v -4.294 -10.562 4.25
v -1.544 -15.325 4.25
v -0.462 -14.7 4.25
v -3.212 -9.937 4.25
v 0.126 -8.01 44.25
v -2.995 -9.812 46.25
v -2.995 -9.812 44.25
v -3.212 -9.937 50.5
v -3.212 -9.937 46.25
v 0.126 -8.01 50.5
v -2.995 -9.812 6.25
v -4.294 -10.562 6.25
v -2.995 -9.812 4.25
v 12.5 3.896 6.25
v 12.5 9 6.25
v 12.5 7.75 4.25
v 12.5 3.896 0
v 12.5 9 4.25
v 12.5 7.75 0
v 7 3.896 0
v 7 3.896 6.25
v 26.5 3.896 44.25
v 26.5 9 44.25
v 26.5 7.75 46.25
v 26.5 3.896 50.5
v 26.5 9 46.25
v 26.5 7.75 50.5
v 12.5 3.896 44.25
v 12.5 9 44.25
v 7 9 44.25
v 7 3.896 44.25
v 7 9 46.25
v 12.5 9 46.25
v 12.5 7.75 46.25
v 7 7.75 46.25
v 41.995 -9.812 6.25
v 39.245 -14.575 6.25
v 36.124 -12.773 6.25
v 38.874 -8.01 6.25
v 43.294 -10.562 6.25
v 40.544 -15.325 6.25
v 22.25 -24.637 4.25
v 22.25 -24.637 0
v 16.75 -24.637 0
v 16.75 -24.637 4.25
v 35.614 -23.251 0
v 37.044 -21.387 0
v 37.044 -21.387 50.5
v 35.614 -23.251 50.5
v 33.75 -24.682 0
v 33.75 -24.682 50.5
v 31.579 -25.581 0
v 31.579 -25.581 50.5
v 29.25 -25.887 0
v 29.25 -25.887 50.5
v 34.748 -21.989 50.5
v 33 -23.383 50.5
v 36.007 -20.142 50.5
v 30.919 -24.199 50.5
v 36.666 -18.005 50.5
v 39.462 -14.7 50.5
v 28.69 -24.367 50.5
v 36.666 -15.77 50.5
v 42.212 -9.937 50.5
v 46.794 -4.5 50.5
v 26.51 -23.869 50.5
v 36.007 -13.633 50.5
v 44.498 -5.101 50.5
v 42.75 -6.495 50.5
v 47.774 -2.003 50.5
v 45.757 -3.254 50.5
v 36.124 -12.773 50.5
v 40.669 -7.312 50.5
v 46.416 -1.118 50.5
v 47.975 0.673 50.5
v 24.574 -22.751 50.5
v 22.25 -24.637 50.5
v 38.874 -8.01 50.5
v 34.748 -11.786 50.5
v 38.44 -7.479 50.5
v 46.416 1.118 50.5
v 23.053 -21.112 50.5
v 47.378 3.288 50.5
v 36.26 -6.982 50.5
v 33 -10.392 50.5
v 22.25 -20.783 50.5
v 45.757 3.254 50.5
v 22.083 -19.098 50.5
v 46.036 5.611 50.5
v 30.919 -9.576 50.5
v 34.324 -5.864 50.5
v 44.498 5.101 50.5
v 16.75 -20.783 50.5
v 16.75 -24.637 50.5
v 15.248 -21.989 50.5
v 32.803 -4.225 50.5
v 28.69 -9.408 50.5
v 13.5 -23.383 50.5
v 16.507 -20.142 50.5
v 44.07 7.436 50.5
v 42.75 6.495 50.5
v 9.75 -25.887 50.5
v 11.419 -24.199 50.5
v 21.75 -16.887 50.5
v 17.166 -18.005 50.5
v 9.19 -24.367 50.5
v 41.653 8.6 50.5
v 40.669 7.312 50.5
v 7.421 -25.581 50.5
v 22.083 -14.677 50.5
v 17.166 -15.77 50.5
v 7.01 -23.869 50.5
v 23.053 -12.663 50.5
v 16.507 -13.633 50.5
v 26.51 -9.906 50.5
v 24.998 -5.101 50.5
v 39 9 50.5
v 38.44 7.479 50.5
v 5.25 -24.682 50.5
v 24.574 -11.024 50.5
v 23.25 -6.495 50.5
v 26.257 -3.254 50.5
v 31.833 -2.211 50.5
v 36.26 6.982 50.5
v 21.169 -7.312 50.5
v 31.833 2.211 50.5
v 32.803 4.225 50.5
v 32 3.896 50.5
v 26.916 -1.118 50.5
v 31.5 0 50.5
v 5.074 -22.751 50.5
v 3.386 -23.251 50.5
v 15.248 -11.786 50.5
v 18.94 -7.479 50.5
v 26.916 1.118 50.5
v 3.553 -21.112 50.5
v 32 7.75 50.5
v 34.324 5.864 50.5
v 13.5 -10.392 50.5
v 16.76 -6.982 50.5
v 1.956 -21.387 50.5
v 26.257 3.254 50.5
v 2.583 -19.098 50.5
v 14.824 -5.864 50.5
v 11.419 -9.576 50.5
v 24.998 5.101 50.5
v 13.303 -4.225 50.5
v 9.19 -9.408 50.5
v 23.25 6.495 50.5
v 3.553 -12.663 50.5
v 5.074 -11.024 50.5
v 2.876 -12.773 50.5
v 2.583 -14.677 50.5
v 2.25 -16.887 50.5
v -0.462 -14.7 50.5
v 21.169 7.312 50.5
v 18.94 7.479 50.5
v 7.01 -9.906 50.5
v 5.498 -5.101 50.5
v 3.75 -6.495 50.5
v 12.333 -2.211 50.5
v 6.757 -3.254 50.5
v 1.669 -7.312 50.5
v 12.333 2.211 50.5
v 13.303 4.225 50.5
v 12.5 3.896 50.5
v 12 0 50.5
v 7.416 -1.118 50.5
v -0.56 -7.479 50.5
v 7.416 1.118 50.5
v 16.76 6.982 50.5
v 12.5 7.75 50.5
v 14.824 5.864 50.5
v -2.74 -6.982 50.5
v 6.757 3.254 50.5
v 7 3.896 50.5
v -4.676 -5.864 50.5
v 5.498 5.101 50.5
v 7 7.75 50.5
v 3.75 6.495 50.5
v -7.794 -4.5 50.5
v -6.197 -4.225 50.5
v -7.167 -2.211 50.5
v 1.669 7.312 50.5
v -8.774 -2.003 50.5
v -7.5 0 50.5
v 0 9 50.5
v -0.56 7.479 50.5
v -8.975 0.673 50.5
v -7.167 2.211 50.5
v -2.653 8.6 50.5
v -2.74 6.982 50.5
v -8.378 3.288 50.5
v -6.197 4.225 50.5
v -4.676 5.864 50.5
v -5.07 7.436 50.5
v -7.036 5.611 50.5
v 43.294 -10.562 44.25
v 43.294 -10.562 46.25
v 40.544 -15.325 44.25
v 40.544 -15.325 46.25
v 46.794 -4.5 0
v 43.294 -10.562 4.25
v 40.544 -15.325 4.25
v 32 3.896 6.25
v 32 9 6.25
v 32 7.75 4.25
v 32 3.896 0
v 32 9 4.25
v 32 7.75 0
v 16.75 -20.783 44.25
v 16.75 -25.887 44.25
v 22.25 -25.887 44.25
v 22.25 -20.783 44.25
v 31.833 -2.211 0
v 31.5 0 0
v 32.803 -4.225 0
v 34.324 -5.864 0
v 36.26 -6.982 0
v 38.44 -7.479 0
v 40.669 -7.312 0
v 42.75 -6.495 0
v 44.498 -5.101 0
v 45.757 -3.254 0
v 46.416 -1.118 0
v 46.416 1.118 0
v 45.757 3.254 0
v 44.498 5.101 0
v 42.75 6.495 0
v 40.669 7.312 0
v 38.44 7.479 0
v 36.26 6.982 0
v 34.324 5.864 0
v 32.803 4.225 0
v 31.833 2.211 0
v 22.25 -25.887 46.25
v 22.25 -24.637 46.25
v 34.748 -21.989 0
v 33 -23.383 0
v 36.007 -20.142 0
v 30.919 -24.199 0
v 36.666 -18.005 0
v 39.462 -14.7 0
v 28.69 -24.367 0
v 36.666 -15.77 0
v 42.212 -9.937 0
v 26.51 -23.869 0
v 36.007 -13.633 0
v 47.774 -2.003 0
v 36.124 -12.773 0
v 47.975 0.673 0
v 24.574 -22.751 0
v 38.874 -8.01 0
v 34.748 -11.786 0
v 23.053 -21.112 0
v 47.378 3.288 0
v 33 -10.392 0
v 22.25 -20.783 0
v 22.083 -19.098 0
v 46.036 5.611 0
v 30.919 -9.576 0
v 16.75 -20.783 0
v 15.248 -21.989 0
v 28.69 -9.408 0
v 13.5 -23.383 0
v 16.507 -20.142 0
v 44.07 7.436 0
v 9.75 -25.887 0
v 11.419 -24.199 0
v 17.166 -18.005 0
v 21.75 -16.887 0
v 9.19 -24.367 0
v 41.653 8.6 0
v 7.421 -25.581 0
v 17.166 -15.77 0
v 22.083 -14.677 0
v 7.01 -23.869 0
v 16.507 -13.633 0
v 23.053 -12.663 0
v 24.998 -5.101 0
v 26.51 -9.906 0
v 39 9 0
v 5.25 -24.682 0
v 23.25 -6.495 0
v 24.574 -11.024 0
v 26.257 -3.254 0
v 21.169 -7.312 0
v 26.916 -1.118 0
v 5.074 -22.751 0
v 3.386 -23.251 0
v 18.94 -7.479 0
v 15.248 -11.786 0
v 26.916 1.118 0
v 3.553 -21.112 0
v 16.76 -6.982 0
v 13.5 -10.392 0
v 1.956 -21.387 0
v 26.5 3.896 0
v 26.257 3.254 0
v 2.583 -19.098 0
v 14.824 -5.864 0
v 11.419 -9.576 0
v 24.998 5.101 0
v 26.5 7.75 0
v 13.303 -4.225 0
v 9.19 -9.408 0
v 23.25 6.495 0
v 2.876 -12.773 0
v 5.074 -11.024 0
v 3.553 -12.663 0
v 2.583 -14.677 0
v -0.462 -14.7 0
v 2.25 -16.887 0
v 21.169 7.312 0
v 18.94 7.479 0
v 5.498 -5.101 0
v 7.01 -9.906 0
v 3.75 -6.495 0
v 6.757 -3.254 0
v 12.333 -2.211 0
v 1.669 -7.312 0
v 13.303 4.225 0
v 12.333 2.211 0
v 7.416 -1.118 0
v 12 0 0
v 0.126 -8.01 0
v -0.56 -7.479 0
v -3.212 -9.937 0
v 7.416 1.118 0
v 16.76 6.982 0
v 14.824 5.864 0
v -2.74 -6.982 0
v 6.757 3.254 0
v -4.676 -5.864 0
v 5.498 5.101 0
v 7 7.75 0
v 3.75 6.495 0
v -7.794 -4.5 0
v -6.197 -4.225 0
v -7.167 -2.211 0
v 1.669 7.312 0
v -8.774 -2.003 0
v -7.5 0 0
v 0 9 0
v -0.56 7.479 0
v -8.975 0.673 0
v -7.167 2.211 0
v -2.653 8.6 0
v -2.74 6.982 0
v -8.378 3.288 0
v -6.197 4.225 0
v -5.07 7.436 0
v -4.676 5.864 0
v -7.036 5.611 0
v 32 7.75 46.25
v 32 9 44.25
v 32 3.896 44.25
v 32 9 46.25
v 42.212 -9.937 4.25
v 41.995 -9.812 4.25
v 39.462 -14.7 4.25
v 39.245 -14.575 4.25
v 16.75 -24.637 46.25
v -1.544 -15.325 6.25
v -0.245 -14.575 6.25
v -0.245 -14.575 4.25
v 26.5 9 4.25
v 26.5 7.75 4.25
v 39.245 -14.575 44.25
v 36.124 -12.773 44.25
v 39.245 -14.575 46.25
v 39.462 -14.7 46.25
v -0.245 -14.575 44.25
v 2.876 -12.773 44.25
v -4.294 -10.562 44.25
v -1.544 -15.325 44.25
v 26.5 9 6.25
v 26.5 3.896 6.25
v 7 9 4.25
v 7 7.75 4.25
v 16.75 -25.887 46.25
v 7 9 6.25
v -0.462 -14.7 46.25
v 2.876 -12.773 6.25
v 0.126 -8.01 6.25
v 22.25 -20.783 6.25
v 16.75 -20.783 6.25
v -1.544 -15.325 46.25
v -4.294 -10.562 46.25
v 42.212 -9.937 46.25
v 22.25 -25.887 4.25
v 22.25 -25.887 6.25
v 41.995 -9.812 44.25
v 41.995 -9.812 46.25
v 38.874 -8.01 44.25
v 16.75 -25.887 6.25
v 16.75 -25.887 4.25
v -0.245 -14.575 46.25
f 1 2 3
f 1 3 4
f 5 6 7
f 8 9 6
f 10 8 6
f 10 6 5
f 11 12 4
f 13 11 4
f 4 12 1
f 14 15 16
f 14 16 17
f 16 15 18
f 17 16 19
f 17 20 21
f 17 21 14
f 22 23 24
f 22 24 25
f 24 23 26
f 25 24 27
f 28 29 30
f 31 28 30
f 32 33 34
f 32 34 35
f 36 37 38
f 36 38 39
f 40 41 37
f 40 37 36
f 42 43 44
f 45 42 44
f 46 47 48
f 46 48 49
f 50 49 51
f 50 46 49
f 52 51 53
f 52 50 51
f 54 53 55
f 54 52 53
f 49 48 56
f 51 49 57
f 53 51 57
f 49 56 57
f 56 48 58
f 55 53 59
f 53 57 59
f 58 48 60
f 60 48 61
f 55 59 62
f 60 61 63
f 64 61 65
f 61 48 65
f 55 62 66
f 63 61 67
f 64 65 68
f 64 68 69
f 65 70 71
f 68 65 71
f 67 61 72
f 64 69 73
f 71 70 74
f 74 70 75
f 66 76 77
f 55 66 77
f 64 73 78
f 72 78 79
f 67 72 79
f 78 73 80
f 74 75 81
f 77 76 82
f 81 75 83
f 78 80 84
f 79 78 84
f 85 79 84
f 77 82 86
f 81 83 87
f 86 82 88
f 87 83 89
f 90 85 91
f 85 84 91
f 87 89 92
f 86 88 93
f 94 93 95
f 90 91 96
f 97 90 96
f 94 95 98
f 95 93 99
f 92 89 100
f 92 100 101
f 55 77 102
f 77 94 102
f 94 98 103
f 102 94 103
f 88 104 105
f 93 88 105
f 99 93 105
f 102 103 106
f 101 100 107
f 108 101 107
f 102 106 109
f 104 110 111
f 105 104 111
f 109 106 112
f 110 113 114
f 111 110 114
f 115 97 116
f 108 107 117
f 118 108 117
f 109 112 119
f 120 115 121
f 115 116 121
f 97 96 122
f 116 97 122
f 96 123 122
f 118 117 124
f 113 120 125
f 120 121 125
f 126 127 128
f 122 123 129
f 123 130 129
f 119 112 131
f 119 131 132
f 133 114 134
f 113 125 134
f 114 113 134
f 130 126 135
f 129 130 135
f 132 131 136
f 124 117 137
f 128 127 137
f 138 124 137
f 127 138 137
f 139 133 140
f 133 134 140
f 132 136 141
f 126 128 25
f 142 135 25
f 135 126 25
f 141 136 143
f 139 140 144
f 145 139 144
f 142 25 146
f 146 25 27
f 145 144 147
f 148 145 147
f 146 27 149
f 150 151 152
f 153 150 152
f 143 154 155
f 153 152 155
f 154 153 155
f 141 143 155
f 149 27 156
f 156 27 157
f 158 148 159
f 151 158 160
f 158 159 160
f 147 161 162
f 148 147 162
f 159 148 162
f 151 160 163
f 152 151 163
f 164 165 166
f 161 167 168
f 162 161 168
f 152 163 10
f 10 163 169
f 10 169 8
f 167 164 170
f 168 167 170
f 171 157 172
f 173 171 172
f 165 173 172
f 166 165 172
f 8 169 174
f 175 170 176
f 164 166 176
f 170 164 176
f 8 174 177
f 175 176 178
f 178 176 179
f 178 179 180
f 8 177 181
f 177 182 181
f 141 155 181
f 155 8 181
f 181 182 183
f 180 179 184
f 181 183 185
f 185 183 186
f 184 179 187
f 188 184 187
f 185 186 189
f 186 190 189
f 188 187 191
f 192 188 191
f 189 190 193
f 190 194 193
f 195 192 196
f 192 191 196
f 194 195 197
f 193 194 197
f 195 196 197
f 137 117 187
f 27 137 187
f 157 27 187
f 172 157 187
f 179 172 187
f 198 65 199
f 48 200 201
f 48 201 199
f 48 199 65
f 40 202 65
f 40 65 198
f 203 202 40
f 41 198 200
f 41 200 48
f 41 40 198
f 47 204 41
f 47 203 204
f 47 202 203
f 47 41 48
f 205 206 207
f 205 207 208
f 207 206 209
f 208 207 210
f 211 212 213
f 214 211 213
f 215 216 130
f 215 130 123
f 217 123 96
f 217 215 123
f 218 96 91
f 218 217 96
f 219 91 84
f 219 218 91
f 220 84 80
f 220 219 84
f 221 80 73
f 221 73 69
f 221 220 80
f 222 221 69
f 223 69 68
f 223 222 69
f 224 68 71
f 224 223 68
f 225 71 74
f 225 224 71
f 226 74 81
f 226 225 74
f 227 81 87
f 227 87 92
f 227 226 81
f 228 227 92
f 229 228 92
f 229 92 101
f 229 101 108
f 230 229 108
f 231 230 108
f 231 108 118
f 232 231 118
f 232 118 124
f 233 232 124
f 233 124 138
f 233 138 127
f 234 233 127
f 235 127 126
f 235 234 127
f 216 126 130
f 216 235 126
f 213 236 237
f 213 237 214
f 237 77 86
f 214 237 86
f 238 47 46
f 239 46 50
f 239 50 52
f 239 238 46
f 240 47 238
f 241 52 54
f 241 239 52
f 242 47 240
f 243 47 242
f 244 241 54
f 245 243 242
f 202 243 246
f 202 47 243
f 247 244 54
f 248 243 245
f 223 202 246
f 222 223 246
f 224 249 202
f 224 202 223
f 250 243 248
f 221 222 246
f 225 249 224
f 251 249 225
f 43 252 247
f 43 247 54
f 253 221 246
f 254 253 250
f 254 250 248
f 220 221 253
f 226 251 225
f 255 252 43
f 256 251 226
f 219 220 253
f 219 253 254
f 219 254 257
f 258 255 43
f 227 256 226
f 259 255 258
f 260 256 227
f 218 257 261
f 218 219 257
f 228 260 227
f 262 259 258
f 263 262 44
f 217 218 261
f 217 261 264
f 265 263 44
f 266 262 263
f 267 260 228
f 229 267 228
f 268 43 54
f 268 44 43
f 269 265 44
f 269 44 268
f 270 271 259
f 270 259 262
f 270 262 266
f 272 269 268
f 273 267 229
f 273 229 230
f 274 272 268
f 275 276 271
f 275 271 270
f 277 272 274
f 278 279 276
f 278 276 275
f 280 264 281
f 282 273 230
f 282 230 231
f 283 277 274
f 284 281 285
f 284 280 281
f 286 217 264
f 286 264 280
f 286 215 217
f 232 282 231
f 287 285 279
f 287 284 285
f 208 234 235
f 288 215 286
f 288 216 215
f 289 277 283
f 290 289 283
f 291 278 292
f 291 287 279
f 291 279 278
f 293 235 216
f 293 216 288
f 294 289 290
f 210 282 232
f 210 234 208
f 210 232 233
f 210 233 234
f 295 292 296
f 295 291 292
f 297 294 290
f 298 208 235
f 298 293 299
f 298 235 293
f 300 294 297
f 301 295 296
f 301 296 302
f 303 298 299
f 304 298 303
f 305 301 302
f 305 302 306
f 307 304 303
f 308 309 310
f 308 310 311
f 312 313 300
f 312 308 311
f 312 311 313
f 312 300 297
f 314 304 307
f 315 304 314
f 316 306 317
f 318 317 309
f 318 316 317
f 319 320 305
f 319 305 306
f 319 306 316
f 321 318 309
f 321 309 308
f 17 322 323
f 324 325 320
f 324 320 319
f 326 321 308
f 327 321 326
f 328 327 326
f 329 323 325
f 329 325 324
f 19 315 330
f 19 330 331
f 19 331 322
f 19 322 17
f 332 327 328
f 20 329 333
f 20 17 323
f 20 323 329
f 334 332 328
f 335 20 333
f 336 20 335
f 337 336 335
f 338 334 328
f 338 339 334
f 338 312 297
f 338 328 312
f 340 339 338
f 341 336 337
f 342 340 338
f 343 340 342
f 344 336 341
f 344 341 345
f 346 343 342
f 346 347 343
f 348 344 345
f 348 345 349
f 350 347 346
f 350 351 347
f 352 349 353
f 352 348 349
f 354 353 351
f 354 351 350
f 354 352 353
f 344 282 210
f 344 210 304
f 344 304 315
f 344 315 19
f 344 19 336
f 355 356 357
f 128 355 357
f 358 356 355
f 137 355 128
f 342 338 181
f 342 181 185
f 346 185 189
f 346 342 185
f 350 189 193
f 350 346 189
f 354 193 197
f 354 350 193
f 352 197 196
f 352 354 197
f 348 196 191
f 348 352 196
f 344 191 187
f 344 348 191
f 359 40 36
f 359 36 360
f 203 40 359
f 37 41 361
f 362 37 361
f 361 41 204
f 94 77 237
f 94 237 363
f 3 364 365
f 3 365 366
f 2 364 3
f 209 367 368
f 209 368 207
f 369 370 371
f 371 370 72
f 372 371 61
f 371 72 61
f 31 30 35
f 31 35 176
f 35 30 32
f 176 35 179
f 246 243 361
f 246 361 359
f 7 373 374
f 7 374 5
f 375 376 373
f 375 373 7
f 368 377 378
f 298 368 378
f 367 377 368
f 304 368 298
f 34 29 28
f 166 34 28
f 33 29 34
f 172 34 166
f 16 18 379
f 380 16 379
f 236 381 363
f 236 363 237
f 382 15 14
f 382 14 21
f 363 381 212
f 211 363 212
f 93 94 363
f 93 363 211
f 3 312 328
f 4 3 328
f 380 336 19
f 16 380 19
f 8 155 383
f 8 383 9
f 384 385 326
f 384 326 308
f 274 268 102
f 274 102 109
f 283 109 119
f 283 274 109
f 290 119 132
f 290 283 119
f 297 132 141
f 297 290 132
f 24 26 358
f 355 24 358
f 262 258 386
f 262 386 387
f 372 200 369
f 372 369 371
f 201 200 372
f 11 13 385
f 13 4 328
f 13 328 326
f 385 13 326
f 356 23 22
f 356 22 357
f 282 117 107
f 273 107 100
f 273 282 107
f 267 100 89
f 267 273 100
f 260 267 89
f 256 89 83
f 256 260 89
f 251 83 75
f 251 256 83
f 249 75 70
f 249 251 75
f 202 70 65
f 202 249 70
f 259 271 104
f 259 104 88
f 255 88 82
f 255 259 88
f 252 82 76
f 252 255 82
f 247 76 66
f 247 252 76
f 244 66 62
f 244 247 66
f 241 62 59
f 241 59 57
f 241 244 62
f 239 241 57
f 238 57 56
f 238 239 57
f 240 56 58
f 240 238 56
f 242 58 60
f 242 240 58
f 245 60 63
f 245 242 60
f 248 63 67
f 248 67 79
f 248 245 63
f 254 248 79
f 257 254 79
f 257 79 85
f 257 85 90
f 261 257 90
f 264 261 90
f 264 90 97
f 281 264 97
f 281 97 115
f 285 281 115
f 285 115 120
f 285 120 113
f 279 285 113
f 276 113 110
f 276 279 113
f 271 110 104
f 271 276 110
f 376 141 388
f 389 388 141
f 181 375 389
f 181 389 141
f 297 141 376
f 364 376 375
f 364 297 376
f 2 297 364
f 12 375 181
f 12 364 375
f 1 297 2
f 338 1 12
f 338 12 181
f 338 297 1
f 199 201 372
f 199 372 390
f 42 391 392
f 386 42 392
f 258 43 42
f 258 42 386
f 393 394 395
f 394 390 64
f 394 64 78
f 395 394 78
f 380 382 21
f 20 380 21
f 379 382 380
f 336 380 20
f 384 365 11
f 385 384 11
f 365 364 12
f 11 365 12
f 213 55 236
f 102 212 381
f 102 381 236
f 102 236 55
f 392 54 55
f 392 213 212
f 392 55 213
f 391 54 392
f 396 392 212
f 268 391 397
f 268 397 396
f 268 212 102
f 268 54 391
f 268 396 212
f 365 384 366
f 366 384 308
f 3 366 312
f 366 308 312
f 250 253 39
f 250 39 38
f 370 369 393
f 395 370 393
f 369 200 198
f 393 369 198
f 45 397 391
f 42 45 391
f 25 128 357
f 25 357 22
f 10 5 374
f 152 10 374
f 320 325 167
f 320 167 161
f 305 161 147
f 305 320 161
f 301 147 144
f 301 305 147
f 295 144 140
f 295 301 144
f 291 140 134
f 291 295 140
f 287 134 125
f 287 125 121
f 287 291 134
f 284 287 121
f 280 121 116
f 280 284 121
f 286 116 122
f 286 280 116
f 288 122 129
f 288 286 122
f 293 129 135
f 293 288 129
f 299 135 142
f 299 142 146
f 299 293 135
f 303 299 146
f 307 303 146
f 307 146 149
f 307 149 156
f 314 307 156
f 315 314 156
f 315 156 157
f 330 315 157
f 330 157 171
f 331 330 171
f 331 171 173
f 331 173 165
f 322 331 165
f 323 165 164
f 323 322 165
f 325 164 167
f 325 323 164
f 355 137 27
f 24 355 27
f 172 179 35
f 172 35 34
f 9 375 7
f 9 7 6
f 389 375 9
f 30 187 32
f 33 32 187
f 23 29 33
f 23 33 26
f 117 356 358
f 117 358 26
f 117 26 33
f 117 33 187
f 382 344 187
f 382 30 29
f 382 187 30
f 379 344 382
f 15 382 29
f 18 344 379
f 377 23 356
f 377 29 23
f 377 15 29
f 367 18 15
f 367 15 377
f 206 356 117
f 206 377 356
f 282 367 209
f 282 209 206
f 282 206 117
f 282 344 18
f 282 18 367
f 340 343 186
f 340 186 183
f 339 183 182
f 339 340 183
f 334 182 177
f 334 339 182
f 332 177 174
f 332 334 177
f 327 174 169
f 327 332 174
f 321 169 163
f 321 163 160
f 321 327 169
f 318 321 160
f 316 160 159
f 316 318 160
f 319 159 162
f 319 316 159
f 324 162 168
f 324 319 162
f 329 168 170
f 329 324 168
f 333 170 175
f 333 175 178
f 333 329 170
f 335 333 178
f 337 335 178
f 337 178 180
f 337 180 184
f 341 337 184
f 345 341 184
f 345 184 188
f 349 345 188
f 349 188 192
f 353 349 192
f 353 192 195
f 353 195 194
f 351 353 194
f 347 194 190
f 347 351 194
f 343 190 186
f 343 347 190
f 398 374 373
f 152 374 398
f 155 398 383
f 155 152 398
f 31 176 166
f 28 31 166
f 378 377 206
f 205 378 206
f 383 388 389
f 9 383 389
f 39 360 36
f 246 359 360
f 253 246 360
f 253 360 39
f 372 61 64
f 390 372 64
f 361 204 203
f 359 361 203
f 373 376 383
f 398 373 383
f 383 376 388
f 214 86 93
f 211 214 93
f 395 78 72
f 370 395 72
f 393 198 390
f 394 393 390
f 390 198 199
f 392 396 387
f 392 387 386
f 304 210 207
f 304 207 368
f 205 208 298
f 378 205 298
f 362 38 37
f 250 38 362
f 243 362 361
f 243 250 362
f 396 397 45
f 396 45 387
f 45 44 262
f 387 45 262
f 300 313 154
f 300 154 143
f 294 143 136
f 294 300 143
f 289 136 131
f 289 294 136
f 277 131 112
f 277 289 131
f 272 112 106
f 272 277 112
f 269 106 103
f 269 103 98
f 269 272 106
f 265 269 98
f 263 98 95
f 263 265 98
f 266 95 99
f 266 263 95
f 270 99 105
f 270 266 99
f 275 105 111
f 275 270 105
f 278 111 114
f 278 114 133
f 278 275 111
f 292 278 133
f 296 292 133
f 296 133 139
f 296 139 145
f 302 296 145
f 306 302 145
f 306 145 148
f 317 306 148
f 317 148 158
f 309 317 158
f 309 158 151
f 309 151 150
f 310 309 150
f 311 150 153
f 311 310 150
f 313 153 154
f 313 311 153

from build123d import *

# Parameters (mm, degrees)
SKETCH1_R               = 7.5
BOSS_EXTRUDE1_DEPTH     = 50.5
SKETCH2_W               = 2
SKETCH2_H               = 5.5
CUT_EXTRUDE1_DEPTH      = 1.5
SKETCH3_W               = 5.5
SKETCH3_H               = 2
CUT_EXTRUDE2_DEPTH      = 1.5
SKETCH4_W               = 5.5
SKETCH4_H               = 2
CUT_EXTRUDE3_DEPTH      = 1.5
SKETCH5_W               = 5.5
SKETCH5_H               = 3.854101966
CUT_EXTRUDE4_DEPTH      = 6.25
MIRROR3_COPY_1_SKETCH_W = 2
MIRROR3_COPY_1_SKETCH_H = 5.5
MIRROR3_COPY_1_DEPTH    = 1.5
MIRROR3_COPY_2_SKETCH_W = 5.5
MIRROR3_COPY_2_SKETCH_H = 2
MIRROR3_COPY_2_DEPTH    = 1.5
MIRROR3_COPY_3_SKETCH_W = 5.5
MIRROR3_COPY_3_SKETCH_H = 2
MIRROR3_COPY_3_DEPTH    = 1.5
MIRROR3_COPY_4_SKETCH_W = 5.5
MIRROR3_COPY_4_SKETCH_H = 3.854101966
MIRROR3_COPY_4_DEPTH    = 6.25


with BuildPart() as part:
    # Sketch1 → Boss-Extrude1 (new body)
    with BuildSketch(Plane.XY):
        with BuildLine():
            Line((0, 9), (39, 9))
            ThreePointArc((39, 9), (46.794228634, 4.5), (46.794228634, -4.5))
            Line((46.794228634, -4.5), (37.044228634, -21.387495374))
            ThreePointArc((37.044228634, -21.387495374), (33.75, -24.681724008), (29.25, -25.887495374))
            Line((29.25, -25.887495374), (9.75, -25.887495374))
            ThreePointArc((9.75, -25.887495374), (5.25, -24.681724008), (1.955771366, -21.387495374))
            Line((1.955771366, -21.387495374), (-7.794228634, -4.5))
            ThreePointArc((-7.794228634, -4.5), (-7.794228634, 4.5), (0, 9))
        make_face()
        with Locations(Location((0, 0, 0), (0, 0, 180))):
            Circle(SKETCH1_R, mode=Mode.SUBTRACT)
        with Locations(Location((9.75, -16.887495374, 0), (0, 0, 180))):
            Circle(SKETCH1_R, mode=Mode.SUBTRACT)
        with Locations(Location((19.5, 0, 0), (0, 0, 180))):
            Circle(SKETCH1_R, mode=Mode.SUBTRACT)
        with Locations(Location((39, 0, 0), (0, 0, 180))):
            Circle(SKETCH1_R, mode=Mode.SUBTRACT)
        with Locations(Location((29.25, -16.887495374, 0), (0, 0, 180))):
            Circle(SKETCH1_R, mode=Mode.SUBTRACT)
    extrude(amount=BOSS_EXTRUDE1_DEPTH)

    # Sketch2 → Cut-Extrude1 (cut)
    with BuildSketch(Plane(origin=(37.044228634, -21.387495374, 0), x_dir=(0, 0, -1), z_dir=(0.8660254037844384, -0.5000000000000007, 0))):
        with Locations((-5.25, 9.75)):
            Rectangle(SKETCH2_W, SKETCH2_H)
    cut_extrude1 = extrude(amount=-CUT_EXTRUDE1_DEPTH, mode=Mode.SUBTRACT)

    # Sketch3 → Cut-Extrude2 (cut)
    with BuildSketch(Plane(origin=(0, 9, 0), x_dir=(1, 0, 0), z_dir=(0, 1, 0))):
        with Locations((29.25, -5.25)):
            Rectangle(SKETCH3_W, SKETCH3_H)
    cut_extrude2 = extrude(amount=-CUT_EXTRUDE2_DEPTH, mode=Mode.SUBTRACT)

    # Sketch4 → Cut-Extrude3 (cut)
    with BuildSketch(Plane.XZ.offset(25.887495374)):
        with Locations((19.5, 5.25)):
            Rectangle(SKETCH4_W, SKETCH4_H)
    cut_extrude3 = extrude(amount=-CUT_EXTRUDE3_DEPTH, mode=Mode.SUBTRACT)

    # Sketch5 → Cut-Extrude4 (cut)
    with BuildSketch(Plane(origin=(0, 0, 0), x_dir=(-1, 0, 0), z_dir=(0, 0, -1))):
        with Locations((-29.25, 5.822949017)):
            Rectangle(SKETCH5_W, SKETCH5_H)
        with Locations((-19.5, -22.710444391)):
            Rectangle(SKETCH5_W, SKETCH5_H)
        Polygon((-38.873946668, -8.010126843), (-36.123946668, -12.773266564), (-39.461696879, -14.700317547), (-42.211696879, -9.937177826), align=None)
    cut_extrude4 = extrude(amount=-CUT_EXTRUDE4_DEPTH, mode=Mode.SUBTRACT)

    # Mirror2: Cut-Extrude1, Cut-Extrude2, Cut-Extrude3, Cut-Extrude4 across plane
    add(cut_extrude1.mirror(Plane.ZY.offset(-19.5)), mode=Mode.SUBTRACT)
    add(cut_extrude2.mirror(Plane.ZY.offset(-19.5)), mode=Mode.SUBTRACT)
    add(cut_extrude3.mirror(Plane.ZY.offset(-19.5)), mode=Mode.SUBTRACT)
    add(cut_extrude4.mirror(Plane.ZY.offset(-19.5)), mode=Mode.SUBTRACT)

    # Mirror3: Cut-Extrude1, Cut-Extrude2, Cut-Extrude3, Cut-Extrude4 across plane
    add(cut_extrude1.mirror(Plane(origin=(0, 0, 25.25), x_dir=(1, 0, 0), z_dir=(0, 0, -1))), mode=Mode.SUBTRACT)
    add(cut_extrude2.mirror(Plane(origin=(0, 0, 25.25), x_dir=(1, 0, 0), z_dir=(0, 0, -1))), mode=Mode.SUBTRACT)
    add(cut_extrude3.mirror(Plane(origin=(0, 0, 25.25), x_dir=(1, 0, 0), z_dir=(0, 0, -1))), mode=Mode.SUBTRACT)
    add(cut_extrude4.mirror(Plane(origin=(0, 0, 25.25), x_dir=(1, 0, 0), z_dir=(0, 0, -1))), mode=Mode.SUBTRACT)

    # Mirror3 copy 1 sketch → Mirror3 copy 1 (cut)
    with BuildSketch(Plane(origin=(1.955771366, -21.387495374, 50.5), x_dir=(0, 0, 1), z_dir=(-0.8660254037844384, -0.5000000000000007, 1.2779807689605148e-15))):
        with Locations((-5.25, 9.75)):
            Rectangle(MIRROR3_COPY_1_SKETCH_W, MIRROR3_COPY_1_SKETCH_H)
    extrude(amount=-MIRROR3_COPY_1_DEPTH, mode=Mode.SUBTRACT)

    # Mirror3 copy 2 sketch → Mirror3 copy 2 (cut)
    with BuildSketch(Plane(origin=(39, 9, 50.5), x_dir=(-1, 0, 0), z_dir=(0, 1, 0))):
        with Locations((29.25, -5.25)):
            Rectangle(MIRROR3_COPY_2_SKETCH_W, MIRROR3_COPY_2_SKETCH_H)
    extrude(amount=-MIRROR3_COPY_2_DEPTH, mode=Mode.SUBTRACT)

    # Mirror3 copy 3 sketch → Mirror3 copy 3 (cut)
    with BuildSketch(Plane(origin=(39, -25.887495374, 50.5), x_dir=(-1, 0, 0), z_dir=(0, -1, 0))):
        with Locations((19.5, 5.25)):
            Rectangle(MIRROR3_COPY_3_SKETCH_W, MIRROR3_COPY_3_SKETCH_H)
    extrude(amount=-MIRROR3_COPY_3_DEPTH, mode=Mode.SUBTRACT)

    # Mirror3 copy 4 sketch → Mirror3 copy 4 (cut)
    with BuildSketch(Plane(origin=(39, 0, 50.5), x_dir=(1, 0, 0), z_dir=(0, 0, 1))):
        with Locations((-29.25, 5.822949017)):
            Rectangle(MIRROR3_COPY_4_SKETCH_W, MIRROR3_COPY_4_SKETCH_H)
        with Locations((-19.5, -22.710444391)):
            Rectangle(MIRROR3_COPY_4_SKETCH_W, MIRROR3_COPY_4_SKETCH_H)
        Polygon((-38.873946668, -8.010126843), (-36.123946668, -12.773266564), (-39.461696879, -14.700317547), (-42.211696879, -9.937177826), align=None)
    extrude(amount=-MIRROR3_COPY_4_DEPTH, mode=Mode.SUBTRACT)


solid = part.part
